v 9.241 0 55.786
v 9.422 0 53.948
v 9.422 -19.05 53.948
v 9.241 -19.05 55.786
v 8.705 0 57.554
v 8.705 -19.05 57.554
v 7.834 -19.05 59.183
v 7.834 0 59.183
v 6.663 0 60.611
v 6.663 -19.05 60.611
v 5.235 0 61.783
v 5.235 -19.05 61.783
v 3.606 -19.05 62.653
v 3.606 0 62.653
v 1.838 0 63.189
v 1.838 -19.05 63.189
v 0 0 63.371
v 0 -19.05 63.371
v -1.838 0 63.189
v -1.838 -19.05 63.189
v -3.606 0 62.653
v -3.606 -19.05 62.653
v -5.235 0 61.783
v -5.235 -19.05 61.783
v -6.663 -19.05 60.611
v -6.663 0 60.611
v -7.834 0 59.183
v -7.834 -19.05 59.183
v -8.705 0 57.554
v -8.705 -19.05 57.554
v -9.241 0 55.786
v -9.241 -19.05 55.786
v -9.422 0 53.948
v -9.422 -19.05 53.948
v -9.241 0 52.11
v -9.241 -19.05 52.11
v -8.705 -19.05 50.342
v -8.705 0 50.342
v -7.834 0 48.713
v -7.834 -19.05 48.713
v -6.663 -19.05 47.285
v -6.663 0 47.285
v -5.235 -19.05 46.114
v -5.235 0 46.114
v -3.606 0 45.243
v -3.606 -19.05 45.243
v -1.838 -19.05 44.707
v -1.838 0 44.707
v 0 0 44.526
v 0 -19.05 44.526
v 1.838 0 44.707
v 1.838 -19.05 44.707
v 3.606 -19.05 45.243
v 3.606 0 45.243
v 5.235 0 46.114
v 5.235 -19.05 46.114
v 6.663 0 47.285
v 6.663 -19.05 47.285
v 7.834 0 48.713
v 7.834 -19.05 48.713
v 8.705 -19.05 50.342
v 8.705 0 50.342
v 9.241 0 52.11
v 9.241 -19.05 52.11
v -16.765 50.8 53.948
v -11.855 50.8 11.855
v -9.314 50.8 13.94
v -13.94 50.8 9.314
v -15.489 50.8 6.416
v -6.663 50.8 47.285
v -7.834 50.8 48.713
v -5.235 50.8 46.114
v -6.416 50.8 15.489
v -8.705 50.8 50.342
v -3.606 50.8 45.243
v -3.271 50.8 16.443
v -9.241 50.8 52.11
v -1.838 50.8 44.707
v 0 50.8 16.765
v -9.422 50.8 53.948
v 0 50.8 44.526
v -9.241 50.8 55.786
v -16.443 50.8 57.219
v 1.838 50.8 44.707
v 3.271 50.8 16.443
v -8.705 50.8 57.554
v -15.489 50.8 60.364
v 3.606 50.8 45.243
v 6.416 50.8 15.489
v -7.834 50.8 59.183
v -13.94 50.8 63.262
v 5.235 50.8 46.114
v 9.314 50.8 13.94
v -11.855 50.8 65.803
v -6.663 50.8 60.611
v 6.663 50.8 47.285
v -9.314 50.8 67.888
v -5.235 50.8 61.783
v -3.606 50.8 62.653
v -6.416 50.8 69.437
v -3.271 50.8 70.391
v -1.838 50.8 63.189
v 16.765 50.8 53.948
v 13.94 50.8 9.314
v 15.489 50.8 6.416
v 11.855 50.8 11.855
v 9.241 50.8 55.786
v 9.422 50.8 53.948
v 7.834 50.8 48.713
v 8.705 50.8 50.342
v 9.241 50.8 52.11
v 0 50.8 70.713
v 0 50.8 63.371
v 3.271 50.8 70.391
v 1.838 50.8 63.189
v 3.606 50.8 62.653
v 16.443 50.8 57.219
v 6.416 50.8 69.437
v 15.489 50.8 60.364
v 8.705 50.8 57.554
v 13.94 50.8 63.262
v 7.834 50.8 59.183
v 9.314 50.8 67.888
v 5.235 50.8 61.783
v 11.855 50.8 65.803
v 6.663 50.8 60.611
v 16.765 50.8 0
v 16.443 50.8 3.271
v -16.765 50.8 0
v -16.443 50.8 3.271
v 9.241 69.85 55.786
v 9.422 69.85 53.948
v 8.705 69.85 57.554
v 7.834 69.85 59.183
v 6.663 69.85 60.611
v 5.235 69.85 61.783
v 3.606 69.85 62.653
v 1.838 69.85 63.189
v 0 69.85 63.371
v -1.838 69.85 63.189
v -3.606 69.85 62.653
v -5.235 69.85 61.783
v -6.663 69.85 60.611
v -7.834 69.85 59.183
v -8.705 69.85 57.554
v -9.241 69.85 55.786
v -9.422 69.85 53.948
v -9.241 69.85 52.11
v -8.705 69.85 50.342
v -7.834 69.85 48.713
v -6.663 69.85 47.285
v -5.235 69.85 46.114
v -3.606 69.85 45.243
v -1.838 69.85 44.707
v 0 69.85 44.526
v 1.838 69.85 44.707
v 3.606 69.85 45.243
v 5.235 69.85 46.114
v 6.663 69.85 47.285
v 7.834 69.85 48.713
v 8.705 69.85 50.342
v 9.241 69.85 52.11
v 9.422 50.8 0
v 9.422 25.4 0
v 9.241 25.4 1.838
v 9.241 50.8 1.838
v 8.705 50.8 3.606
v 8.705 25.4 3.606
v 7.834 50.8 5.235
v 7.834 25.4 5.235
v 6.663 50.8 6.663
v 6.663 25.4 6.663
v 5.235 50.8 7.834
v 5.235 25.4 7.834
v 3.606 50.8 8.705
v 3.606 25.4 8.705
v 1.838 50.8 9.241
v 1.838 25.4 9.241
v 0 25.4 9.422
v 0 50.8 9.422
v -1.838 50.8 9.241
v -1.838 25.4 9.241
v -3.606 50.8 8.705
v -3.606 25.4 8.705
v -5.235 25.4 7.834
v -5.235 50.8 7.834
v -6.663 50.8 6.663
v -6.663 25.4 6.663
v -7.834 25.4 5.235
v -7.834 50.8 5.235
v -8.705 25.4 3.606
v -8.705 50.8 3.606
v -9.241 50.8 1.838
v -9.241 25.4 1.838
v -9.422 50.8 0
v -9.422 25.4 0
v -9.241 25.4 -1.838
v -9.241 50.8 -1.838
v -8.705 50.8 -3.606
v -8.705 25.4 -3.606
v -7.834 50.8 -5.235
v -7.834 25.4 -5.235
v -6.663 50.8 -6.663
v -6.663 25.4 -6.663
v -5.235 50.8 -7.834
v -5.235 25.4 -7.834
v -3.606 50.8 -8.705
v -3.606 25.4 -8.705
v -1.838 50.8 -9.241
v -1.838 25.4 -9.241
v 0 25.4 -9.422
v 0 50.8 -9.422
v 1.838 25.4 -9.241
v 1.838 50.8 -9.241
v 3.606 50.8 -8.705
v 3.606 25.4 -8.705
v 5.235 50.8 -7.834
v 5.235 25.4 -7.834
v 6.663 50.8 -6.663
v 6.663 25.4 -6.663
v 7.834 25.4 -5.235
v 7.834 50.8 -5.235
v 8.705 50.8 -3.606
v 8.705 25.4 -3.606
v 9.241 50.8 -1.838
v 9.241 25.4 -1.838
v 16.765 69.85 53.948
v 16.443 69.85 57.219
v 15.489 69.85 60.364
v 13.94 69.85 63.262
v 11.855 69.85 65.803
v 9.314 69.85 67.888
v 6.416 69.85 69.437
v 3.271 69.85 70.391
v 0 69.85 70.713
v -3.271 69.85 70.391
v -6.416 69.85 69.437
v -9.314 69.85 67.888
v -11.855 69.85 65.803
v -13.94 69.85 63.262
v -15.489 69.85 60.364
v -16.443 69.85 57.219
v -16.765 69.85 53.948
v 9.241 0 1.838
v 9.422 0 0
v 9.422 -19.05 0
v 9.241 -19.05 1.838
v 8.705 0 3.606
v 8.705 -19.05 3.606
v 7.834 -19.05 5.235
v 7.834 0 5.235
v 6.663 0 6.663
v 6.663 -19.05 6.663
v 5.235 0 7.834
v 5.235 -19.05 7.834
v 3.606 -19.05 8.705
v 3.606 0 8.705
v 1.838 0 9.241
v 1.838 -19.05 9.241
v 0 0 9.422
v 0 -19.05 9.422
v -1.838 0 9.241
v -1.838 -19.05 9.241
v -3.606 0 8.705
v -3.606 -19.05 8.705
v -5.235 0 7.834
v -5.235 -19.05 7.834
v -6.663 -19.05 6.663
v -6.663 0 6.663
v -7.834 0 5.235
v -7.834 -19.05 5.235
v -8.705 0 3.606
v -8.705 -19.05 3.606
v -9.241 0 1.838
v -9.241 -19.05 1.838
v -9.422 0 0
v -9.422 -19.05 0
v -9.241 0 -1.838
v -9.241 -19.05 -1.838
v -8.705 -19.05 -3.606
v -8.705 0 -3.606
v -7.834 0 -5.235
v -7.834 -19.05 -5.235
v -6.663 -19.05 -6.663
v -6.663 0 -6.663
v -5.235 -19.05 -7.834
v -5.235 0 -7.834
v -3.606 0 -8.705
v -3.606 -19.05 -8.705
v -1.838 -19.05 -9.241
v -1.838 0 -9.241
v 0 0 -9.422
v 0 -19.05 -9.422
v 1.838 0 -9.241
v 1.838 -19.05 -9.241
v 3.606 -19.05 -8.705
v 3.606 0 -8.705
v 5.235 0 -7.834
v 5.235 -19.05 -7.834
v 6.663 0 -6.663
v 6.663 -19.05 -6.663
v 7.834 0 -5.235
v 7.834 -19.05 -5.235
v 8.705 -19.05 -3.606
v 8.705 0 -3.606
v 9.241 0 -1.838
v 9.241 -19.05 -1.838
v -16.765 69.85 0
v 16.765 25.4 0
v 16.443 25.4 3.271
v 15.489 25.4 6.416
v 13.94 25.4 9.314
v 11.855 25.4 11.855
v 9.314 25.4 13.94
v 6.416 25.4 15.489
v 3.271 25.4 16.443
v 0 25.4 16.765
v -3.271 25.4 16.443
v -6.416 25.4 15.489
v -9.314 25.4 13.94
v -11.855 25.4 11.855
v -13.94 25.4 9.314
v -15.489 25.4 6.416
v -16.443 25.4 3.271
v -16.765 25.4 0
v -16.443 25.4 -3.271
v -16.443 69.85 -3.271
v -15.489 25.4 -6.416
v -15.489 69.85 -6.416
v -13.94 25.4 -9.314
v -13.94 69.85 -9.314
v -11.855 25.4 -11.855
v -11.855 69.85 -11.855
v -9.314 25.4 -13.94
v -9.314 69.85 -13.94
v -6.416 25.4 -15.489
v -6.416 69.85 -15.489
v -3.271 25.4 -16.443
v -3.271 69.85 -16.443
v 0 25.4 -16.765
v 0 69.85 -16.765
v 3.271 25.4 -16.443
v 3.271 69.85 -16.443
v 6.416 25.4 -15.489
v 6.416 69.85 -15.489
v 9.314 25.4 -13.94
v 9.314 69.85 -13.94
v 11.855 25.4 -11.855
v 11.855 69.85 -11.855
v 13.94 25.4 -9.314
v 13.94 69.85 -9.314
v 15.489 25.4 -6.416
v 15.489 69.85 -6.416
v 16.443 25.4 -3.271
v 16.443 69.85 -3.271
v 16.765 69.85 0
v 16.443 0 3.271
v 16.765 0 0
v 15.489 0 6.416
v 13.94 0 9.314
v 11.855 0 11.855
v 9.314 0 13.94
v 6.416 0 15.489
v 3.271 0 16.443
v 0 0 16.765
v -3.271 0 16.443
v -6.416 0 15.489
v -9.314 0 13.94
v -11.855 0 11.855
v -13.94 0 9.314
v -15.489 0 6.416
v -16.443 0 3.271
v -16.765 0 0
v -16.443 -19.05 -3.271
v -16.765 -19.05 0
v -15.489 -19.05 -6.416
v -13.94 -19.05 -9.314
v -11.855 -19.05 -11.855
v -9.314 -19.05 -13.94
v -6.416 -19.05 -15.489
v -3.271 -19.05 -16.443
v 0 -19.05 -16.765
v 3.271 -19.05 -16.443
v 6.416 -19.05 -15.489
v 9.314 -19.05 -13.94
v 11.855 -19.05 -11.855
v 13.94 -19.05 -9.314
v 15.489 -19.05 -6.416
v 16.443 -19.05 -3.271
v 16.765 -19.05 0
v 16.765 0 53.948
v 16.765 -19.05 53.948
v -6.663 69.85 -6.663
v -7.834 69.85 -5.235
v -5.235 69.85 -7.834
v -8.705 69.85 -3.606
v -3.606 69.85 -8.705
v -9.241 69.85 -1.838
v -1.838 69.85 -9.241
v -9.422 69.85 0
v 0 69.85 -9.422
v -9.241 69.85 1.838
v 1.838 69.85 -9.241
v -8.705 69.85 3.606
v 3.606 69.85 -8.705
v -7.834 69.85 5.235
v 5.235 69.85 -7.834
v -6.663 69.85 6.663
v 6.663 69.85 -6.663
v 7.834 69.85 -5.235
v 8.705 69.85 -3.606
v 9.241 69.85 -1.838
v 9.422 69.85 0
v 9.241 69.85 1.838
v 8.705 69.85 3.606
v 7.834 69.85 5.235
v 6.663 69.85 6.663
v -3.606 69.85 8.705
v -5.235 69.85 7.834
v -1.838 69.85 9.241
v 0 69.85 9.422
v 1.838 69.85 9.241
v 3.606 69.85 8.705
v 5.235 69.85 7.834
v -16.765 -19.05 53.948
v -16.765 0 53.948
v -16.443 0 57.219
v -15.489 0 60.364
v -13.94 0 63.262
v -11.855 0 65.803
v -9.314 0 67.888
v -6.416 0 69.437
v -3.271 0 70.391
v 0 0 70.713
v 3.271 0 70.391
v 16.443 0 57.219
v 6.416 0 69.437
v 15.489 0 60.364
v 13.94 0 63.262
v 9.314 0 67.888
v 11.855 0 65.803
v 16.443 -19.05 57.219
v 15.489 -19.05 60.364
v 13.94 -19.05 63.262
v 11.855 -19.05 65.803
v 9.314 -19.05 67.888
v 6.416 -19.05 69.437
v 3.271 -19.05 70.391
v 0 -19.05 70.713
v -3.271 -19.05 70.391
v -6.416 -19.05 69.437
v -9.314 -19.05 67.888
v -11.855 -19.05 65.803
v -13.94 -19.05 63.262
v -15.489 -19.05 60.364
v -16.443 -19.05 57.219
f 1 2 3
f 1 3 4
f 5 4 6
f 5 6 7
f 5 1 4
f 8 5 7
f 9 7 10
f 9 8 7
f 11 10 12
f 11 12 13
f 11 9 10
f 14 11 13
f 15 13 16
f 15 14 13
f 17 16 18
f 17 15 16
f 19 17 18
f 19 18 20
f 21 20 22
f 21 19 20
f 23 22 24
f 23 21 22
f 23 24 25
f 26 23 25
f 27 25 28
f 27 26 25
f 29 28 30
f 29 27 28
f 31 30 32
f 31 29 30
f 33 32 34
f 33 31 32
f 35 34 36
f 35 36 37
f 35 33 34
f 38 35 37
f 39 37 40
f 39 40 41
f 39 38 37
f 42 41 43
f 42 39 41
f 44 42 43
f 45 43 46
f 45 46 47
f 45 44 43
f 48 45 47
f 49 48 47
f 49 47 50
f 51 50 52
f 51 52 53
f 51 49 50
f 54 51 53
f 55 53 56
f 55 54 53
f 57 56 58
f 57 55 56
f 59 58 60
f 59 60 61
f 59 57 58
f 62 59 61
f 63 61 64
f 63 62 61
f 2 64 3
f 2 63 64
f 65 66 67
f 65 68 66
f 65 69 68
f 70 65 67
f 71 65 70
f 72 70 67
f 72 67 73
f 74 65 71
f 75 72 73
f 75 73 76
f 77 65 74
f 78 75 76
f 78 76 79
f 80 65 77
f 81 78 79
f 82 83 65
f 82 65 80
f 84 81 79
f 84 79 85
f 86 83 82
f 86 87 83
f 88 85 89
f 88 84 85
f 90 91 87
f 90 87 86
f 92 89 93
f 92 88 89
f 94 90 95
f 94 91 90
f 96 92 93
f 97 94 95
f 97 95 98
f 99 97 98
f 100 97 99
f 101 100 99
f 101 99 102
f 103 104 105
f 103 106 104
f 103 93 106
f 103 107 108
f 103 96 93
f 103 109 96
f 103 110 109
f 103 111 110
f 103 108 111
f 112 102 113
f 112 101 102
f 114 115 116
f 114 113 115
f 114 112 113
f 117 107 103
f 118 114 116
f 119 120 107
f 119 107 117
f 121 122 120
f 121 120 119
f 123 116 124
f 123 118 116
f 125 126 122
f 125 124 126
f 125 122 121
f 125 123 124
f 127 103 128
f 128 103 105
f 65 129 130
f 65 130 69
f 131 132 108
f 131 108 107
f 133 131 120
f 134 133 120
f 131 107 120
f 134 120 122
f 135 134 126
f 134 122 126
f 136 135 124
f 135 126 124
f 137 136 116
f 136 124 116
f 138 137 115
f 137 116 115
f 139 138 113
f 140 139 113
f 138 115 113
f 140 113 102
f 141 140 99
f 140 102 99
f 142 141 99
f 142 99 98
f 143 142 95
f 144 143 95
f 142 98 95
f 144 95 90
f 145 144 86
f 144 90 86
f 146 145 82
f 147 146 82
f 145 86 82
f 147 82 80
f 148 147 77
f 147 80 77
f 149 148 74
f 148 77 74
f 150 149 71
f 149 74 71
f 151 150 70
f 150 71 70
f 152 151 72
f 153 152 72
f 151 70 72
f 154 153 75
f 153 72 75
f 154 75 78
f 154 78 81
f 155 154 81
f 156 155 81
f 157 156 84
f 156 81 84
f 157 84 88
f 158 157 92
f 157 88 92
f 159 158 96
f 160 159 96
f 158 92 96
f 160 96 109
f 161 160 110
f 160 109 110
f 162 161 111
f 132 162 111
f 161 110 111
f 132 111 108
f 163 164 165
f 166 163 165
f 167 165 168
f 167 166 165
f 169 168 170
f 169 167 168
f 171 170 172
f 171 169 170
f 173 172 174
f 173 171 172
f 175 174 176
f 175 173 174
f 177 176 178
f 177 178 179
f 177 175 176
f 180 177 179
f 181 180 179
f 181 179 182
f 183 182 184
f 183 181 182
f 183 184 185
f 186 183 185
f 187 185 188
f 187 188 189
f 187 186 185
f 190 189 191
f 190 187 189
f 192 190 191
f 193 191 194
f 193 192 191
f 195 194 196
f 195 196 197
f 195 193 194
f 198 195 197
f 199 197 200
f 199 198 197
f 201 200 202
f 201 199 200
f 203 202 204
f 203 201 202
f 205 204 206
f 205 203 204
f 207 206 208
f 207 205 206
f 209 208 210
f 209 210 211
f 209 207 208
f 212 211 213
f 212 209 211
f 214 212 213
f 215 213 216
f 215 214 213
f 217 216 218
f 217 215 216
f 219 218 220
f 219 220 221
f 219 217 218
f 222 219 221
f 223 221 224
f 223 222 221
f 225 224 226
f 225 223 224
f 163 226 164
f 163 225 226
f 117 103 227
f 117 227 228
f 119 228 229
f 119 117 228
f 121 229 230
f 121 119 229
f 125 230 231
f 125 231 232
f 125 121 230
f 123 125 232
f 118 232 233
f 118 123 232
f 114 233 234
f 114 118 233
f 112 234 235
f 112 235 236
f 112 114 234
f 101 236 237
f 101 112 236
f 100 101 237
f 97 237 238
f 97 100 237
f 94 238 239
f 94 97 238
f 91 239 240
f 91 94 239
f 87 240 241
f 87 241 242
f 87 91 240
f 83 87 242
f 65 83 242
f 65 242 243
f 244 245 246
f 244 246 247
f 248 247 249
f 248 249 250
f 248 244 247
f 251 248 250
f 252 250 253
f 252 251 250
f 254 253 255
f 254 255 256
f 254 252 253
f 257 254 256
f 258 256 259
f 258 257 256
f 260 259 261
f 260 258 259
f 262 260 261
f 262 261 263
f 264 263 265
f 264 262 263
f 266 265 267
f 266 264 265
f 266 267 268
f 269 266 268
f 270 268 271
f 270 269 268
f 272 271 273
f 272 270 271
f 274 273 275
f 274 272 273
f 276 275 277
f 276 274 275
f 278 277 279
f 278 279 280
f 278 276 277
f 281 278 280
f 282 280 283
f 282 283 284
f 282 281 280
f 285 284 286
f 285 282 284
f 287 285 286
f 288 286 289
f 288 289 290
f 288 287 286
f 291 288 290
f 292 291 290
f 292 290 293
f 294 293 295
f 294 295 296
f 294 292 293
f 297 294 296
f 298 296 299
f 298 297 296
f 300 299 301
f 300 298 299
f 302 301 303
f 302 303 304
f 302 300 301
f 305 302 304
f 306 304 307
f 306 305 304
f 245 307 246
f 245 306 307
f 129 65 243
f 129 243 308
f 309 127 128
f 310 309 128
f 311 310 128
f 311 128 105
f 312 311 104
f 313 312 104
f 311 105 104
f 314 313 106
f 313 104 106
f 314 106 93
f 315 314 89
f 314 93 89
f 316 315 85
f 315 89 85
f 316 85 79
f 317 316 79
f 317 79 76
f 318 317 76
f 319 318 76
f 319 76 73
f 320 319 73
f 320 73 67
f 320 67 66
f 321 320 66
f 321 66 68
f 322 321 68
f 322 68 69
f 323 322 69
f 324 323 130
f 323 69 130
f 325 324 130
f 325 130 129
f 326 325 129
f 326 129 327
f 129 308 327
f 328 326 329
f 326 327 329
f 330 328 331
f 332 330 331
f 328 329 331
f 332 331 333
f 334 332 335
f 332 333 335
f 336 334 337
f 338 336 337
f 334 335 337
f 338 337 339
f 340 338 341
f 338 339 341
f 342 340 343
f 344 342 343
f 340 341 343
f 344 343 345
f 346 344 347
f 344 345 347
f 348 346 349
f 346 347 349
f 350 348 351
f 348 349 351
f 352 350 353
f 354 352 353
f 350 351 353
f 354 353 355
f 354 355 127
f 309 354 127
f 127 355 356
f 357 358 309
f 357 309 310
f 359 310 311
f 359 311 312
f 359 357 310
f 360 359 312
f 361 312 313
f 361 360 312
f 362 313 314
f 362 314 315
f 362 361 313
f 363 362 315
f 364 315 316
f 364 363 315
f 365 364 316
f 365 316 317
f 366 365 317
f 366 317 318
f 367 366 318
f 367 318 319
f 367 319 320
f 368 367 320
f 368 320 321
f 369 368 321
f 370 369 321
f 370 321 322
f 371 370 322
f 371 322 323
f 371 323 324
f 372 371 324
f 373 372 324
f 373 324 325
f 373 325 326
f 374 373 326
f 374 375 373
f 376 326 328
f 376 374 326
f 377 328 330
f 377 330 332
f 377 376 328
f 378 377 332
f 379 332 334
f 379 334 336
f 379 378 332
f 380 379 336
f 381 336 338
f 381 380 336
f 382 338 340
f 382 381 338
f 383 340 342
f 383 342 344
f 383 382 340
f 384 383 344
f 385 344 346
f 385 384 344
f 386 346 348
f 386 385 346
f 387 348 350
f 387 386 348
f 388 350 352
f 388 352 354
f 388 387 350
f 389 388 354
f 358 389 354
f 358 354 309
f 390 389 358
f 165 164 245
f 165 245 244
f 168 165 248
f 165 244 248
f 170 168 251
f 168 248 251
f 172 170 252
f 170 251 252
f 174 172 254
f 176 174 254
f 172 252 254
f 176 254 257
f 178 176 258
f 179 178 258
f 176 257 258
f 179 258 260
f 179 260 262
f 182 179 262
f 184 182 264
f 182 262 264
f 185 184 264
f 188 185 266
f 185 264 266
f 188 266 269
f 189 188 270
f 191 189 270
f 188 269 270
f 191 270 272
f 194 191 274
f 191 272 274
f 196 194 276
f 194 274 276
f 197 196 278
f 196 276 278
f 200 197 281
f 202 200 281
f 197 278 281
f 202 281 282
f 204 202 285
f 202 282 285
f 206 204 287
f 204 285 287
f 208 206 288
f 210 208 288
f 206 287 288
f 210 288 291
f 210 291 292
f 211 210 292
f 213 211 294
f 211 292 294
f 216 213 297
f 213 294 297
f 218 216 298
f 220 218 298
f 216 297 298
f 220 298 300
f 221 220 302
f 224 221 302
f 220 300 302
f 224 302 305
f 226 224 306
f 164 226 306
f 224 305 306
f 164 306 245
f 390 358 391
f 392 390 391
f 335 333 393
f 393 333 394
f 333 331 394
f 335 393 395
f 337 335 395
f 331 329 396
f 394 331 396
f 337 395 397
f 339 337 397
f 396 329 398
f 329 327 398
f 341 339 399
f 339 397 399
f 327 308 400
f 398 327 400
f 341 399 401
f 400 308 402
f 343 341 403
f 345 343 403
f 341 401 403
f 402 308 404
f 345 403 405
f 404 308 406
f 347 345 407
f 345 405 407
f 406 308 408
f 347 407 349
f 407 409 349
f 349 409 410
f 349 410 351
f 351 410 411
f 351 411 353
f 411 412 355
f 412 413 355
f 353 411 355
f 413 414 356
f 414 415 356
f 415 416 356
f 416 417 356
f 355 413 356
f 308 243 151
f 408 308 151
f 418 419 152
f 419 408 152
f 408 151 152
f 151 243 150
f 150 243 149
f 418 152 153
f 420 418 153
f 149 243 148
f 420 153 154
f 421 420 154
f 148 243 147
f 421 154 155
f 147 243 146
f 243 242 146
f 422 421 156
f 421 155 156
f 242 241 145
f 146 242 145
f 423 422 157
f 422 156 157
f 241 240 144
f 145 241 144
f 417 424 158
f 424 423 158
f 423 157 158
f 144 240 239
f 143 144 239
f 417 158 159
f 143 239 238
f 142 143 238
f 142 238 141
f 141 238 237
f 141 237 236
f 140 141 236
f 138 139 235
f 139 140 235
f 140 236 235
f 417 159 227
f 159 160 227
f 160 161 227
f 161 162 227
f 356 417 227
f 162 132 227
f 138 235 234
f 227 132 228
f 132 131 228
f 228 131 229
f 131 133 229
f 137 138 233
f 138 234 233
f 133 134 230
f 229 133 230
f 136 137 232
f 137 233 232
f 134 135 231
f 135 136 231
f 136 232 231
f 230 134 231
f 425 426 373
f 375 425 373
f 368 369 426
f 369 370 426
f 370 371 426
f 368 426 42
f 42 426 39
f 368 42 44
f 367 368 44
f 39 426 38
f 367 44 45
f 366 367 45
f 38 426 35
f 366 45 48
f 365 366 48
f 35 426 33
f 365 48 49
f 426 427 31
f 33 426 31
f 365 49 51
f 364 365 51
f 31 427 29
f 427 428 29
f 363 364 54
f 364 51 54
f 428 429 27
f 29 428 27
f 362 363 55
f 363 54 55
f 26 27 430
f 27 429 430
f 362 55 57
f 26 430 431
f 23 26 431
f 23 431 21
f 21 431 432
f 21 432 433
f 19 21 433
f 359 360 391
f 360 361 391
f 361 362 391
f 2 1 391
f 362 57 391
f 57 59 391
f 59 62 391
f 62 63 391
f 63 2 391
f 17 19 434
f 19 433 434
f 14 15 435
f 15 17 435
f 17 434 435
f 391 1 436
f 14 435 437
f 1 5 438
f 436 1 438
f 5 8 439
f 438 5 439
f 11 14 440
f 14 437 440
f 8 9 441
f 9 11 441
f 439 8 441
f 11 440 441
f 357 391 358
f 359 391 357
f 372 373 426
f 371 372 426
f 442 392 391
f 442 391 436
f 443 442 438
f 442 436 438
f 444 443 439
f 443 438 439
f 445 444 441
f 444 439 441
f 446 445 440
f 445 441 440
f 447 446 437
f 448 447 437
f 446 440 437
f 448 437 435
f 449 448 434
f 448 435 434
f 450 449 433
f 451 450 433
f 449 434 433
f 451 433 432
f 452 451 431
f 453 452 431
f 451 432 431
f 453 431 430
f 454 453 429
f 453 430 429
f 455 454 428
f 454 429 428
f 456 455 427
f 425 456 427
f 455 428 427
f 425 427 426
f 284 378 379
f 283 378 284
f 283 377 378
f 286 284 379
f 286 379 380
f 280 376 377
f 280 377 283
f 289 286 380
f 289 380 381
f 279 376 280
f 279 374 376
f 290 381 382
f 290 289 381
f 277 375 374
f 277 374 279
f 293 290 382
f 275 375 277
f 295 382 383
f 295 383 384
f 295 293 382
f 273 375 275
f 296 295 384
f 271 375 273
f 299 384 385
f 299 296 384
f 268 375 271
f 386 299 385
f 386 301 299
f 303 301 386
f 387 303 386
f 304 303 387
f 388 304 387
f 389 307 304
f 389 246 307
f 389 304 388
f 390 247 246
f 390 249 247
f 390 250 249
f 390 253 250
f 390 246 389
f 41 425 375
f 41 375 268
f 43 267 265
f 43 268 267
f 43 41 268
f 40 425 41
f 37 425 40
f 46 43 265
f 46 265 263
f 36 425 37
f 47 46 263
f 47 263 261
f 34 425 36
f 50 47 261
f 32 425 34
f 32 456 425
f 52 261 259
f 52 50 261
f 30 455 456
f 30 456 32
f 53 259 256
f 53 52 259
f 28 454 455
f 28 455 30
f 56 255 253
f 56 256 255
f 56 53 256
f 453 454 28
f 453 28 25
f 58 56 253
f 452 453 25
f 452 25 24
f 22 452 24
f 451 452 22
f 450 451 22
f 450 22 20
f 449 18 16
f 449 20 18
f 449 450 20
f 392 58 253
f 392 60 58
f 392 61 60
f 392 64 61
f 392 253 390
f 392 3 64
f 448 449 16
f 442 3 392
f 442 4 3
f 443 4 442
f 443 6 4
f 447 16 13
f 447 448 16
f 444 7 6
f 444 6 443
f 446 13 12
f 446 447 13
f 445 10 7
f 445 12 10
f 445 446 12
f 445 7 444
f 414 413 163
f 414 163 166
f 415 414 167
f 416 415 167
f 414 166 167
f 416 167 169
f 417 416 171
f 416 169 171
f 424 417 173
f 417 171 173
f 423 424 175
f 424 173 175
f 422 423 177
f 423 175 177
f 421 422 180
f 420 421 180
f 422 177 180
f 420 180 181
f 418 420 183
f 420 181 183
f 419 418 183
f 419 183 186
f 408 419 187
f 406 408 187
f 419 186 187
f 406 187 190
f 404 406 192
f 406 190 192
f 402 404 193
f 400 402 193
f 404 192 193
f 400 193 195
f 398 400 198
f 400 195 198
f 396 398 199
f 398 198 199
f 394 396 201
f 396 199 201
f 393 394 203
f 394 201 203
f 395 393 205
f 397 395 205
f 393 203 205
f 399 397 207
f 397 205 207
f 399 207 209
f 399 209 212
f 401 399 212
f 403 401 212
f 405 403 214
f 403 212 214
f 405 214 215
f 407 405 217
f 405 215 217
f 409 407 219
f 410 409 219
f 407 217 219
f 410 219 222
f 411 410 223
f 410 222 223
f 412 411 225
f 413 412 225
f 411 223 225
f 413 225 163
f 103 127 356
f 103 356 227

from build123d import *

# Parameters (mm, degrees)
F0_R     = 9.422472
F1_DEPTH = 19.05
F2_DEPTH = 25.4


with BuildPart() as f1:
    # F0 (on Front) → F1 (new body)
    with BuildSketch(Plane.XZ):
        with BuildLine():
            ThreePointArc((-16.764912, 53.948052), (0, 37.183141), (16.764912, 53.948052))
            ThreePointArc((16.764912, 53.948052), (0, 70.712964), (-16.764912, 53.948052))
        make_face()
        with Locations((0, 53.948052)):
            Circle(F0_R, mode=Mode.SUBTRACT)
        with BuildLine():
            ThreePointArc((-16.764912, 0), (0, 16.764912), (16.764912, 0))
            Line((16.764912, 0), (16.764912, 53.948052))
            ThreePointArc((16.764912, 53.948052), (0, 37.183141), (-16.764912, 53.948052))
            Line((-16.764912, 53.948052), (-16.764912, 0))
        make_face()
        with BuildLine():
            ThreePointArc((-16.764912, 0), (0, -16.764912), (16.764912, 0))
            ThreePointArc((16.764912, 0), (0, 16.764912), (-16.764912, 0))
        make_face()
        Circle(F0_R, mode=Mode.SUBTRACT)
    extrude(amount=F1_DEPTH)

    # F0 (on Front) → F2 (join)
    with BuildSketch(Plane.XZ):
        with BuildLine():
            ThreePointArc((-16.764912, 0), (0, -16.764912), (16.764912, 0))
            ThreePointArc((16.764912, 0), (0, 16.764912), (-16.764912, 0))
        make_face()
        Circle(F0_R, mode=Mode.SUBTRACT)
    extrude(amount=-F2_DEPTH)

    # F3: F1 across face


with BuildPart() as f1_1:
    add(f1.part)
    add(f1.part.mirror(Plane(origin=(0, 25.4, 0), x_dir=(1, 0, 0), z_dir=(0, 1, 0))))


solid = f1_1.part
